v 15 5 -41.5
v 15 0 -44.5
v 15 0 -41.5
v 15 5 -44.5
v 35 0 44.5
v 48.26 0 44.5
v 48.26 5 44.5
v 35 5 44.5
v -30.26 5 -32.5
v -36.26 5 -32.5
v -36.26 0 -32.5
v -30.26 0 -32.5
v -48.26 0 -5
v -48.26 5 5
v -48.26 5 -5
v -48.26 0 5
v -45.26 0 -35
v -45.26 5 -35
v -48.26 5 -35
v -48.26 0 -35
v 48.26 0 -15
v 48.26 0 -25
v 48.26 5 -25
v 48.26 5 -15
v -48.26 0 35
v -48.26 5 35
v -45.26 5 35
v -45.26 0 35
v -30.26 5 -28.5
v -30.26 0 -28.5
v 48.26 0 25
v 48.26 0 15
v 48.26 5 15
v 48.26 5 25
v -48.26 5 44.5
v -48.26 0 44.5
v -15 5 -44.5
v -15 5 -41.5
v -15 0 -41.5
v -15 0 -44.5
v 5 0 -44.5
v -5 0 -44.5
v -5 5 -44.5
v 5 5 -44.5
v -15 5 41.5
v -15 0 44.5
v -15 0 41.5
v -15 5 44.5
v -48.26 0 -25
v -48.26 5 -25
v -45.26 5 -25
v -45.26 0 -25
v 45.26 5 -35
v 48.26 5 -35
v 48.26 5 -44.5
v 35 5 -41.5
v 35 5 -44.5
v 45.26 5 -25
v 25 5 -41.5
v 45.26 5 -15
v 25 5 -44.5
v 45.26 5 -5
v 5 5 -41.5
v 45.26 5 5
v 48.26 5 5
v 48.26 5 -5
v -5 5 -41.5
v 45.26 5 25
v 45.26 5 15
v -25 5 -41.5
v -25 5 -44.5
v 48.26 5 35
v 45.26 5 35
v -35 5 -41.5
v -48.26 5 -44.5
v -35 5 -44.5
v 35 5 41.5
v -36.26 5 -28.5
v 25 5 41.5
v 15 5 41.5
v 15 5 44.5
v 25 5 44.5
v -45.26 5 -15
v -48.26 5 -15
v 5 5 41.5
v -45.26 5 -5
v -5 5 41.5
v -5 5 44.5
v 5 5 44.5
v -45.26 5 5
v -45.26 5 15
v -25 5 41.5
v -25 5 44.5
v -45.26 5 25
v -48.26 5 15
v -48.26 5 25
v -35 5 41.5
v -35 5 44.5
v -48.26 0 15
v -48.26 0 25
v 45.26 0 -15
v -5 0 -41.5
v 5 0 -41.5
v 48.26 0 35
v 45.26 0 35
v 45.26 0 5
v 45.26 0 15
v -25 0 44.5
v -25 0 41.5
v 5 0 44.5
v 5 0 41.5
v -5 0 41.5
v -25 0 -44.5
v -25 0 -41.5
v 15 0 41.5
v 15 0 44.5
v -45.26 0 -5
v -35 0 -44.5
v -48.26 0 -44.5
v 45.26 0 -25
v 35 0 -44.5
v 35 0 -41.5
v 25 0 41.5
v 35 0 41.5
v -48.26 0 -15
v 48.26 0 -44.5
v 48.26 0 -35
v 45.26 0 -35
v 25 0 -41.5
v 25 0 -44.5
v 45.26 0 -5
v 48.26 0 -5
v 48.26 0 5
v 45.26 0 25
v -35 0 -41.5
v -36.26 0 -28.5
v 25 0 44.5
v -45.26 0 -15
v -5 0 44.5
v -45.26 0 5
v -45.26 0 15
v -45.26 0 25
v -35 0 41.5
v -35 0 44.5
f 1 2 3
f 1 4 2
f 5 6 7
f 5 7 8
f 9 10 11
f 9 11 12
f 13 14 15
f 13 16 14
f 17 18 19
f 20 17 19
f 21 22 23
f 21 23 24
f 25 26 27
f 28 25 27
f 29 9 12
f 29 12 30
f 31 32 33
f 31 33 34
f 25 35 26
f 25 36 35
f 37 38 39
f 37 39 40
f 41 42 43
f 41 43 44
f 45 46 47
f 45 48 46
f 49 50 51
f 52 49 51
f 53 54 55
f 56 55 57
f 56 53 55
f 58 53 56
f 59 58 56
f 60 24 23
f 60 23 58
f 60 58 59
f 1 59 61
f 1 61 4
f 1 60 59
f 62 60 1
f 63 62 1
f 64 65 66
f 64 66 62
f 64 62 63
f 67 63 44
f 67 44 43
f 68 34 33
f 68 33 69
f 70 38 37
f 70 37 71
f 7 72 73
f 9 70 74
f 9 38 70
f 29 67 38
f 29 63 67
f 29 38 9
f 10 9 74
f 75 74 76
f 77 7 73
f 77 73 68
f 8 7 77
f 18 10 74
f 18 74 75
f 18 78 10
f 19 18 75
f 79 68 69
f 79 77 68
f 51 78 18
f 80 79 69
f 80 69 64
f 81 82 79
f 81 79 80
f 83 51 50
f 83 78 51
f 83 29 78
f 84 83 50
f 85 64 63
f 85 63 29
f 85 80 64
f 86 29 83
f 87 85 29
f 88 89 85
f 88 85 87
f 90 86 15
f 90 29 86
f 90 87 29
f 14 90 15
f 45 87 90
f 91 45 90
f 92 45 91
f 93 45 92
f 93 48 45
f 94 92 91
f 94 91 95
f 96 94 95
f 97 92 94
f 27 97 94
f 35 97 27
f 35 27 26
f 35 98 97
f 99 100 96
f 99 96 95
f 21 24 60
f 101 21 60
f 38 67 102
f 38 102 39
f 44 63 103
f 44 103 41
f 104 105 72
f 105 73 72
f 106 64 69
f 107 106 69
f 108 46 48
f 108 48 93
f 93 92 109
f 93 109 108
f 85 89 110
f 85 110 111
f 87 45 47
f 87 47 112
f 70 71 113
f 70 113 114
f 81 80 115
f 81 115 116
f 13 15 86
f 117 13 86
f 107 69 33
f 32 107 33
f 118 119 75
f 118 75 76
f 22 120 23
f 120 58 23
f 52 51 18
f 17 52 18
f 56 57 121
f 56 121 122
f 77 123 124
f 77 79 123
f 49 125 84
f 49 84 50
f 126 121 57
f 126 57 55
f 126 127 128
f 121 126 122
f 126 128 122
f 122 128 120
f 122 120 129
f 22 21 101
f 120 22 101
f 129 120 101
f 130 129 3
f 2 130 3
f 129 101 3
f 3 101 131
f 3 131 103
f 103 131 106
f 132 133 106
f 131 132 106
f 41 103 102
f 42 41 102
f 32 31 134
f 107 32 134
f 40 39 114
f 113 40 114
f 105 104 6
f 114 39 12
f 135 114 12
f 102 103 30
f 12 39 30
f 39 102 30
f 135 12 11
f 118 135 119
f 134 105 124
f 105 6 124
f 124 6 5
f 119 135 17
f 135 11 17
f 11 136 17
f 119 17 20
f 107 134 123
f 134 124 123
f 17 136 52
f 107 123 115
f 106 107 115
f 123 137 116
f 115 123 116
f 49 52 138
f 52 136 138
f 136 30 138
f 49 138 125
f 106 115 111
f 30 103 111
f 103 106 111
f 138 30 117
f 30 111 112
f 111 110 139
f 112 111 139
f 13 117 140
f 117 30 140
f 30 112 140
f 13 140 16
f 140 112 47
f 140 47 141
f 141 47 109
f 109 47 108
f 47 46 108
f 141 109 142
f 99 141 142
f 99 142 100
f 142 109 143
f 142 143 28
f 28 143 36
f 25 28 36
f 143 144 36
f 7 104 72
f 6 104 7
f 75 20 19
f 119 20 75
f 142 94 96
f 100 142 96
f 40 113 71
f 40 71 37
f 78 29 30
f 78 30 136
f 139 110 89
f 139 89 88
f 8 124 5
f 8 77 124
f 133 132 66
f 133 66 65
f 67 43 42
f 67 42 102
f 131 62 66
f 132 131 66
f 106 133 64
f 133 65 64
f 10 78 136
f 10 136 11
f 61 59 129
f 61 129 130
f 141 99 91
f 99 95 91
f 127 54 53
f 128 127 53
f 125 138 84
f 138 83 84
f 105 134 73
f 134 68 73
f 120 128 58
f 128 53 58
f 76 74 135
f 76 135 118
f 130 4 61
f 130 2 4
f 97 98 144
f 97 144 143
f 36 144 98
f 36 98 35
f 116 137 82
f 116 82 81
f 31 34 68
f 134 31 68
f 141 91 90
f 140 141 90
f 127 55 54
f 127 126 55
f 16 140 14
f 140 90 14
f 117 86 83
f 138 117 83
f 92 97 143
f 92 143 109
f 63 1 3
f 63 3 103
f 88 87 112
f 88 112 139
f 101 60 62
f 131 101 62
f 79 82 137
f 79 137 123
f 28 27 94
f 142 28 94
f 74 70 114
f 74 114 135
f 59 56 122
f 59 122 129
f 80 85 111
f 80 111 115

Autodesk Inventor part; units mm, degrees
ref_plane "YZ Plane" through (0, 0, 0) normal (1, 0, 0) x (0, 1, 0)
ref_plane "XZ Plane" through (0, 0, 0) normal (0, 1, 0) x (-1, 0, 0)
ref_plane "XY Plane" through (0, 0, 0) normal (0, 0, 1) x (1, 0, 0)
sketch "Sketch2" plane through (0, 0, 0) normal (0, 1, 0) x (-1, 0, 0)
  line L0 (-48.26, 44.5) -> (48.26, 44.5)
  line L1 (48.26, 44.5) -> (48.26, -44.5)
  line L2 (48.26, -44.5) -> (-48.26, -44.5)
  line L3 (-48.26, -44.5) -> (-48.26, 44.5)
  line L4 (-48.26, 44.5) -> (48.26, -44.5) construction
  line L5 (48.26, 44.5) -> (-48.26, -44.5) construction
  point P0 (0, 0)
  dimension "d0" = 96.52
  dimension "d1" = 89
extrude "Extrusion1" add sketch "Sketch2" along normal blind 5
sketch "Sketch3" plane through (0, 5, 0) normal (0, 1, 0) x (1, 0, 0)
  line L0 (48.26, 44.5) -> (-48.26, 44.5) construction
  line L1 (-15, 44.5) -> (-5, 44.5)
  line L2 (-5, 44.5) -> (-5, 41.5)
  line L3 (-5, 41.5) -> (-15, 41.5)
  line L4 (-15, 41.5) -> (-15, 44.5)
  line L5 (0, 62.3) -> (0, -62.3) construction
  point P0 (0, 0)
  dimension "d4" = 10
  dimension "d5" = 3
  dimension "d6" = 5
extrude "Extrusion2" cut sketch "Sketch3" against normal through all
pattern_linear "Rectangular Pattern1" count 2 spacing 20 along (-1, 0, 0) count 2 spacing 40 along (1, 0, 0) of "Extrusion2"
mirror "Mirror1" about plane through (0, 0, 0) normal (0, 0, 1) of "Extrusion2", "Rectangular Pattern1"
sketch "Sketch4" plane through (0, 5, 0) normal (0, 1, 0) x (1, 0, 0)
  line L0 (-48.26, 44.5) -> (-48.26, -44.5) construction
  line L1 (-48.26, 5) -> (-45.26, 5)
  line L2 (-45.26, 5) -> (-45.26, 15)
  line L3 (-45.26, 15) -> (-48.26, 15)
  line L4 (-48.26, 15) -> (-48.26, 5)
  line L5 (67.564, 0) -> (-67.564, 0) construction
  point P0 (0, 0)
  dimension "d15" = 3
  dimension "d16" = 10
  dimension "d17" = 5
extrude "Extrusion3" cut sketch "Sketch4" against normal through all
pattern_linear "Rectangular Pattern2" count 2 spacing 20 along (0, 0, -1) count 2 spacing 40 along (0, 0, 1) of "Extrusion3"
mirror "Mirror2" about plane through (0, 0, 0) normal (1, 0, 0) of "Extrusion3", "Rectangular Pattern2"
sketch "Sketch5" plane through (0, 5, 0) normal (0, 1, 0) x (1, 0, 0)
  line L0 (-36.26, 32.5) -> (-30.26, 32.5)
  line L1 (-30.26, 32.5) -> (-30.26, 28.5)
  line L2 (-30.26, 28.5) -> (-36.26, 28.5)
  line L3 (-36.26, 28.5) -> (-36.26, 32.5)
  line L4 (-35, 44.5) -> (-48.26, 44.5) construction
  line L5 (-48.26, 25) -> (-48.26, 15) construction
  point P0 (0, 0)
  dimension "d26" = 6
  dimension "d27" = 4
  dimension "d28" = 12
  dimension "d29" = 12
extrude "Extrusion4" cut sketch "Sketch5" against normal through all
equation "\"d0\" = Module_Width"
equation "\"d1\" = Module_Height"
equation "\"d2\" = Module_Back_Thickness"
equation "\"d4\" = Module_Case_SlotWidth"
equation "\"d5\" = Module_Case_SlotDepth"
equation "\"d6\" = 0.5 * Module_Case_SlotWidth"
equation "\"d7\" = ModuleBottomThickness"
equation "\"d11\" = 2 * Module_Case_SlotWidth"
equation "\"d14\" = 4 * Module_Case_SlotWidth"
equation "\"d15\" = Module_Case_SlotDepth"
equation "\"d16\" = Module_Case_SlotWidth"
equation "\"d17\" = 0.5 * Module_Case_SlotWidth"
equation "\"d18\" = ModuleBottomThickness"
equation "\"d22\" = 2 * Module_Case_SlotWidth"
equation "\"d25\" = 4 * Module_Case_SlotWidth"
equation "\"d26\" = Module_Connector_Width"
equation "\"d27\" = Module_Connector_Depth"
equation "\"d30\" = ModuleBottomThickness"
equation "\"ModuleBottomThickness\" = 5"
equation "\"RackWidth\" = 482.6"
equation "\"U\" = 44.5"
equation "\"Module_Width\" = 96.52"
equation "\"Module_Height\" = 89"
equation "\"Module_Case_Thickness\" = 3"
equation "\"Module_Back_Thickness\" = 5"
equation "\"Module_Case_SlotDepth\" = 3"
equation "\"Module_Case_SlotWidth\" = 10"
equation "\"Module_Connector_Width\" = 6"
equation "\"Module_Connector_Depth\" = 4"
equation "\"Module_StatusIndicatorDiameter\" = 5"
equation "\"Module_Case_BottomSlotDepth\" = 5"
properties part number "BackPlateBase" material "Wood (Birch)"
